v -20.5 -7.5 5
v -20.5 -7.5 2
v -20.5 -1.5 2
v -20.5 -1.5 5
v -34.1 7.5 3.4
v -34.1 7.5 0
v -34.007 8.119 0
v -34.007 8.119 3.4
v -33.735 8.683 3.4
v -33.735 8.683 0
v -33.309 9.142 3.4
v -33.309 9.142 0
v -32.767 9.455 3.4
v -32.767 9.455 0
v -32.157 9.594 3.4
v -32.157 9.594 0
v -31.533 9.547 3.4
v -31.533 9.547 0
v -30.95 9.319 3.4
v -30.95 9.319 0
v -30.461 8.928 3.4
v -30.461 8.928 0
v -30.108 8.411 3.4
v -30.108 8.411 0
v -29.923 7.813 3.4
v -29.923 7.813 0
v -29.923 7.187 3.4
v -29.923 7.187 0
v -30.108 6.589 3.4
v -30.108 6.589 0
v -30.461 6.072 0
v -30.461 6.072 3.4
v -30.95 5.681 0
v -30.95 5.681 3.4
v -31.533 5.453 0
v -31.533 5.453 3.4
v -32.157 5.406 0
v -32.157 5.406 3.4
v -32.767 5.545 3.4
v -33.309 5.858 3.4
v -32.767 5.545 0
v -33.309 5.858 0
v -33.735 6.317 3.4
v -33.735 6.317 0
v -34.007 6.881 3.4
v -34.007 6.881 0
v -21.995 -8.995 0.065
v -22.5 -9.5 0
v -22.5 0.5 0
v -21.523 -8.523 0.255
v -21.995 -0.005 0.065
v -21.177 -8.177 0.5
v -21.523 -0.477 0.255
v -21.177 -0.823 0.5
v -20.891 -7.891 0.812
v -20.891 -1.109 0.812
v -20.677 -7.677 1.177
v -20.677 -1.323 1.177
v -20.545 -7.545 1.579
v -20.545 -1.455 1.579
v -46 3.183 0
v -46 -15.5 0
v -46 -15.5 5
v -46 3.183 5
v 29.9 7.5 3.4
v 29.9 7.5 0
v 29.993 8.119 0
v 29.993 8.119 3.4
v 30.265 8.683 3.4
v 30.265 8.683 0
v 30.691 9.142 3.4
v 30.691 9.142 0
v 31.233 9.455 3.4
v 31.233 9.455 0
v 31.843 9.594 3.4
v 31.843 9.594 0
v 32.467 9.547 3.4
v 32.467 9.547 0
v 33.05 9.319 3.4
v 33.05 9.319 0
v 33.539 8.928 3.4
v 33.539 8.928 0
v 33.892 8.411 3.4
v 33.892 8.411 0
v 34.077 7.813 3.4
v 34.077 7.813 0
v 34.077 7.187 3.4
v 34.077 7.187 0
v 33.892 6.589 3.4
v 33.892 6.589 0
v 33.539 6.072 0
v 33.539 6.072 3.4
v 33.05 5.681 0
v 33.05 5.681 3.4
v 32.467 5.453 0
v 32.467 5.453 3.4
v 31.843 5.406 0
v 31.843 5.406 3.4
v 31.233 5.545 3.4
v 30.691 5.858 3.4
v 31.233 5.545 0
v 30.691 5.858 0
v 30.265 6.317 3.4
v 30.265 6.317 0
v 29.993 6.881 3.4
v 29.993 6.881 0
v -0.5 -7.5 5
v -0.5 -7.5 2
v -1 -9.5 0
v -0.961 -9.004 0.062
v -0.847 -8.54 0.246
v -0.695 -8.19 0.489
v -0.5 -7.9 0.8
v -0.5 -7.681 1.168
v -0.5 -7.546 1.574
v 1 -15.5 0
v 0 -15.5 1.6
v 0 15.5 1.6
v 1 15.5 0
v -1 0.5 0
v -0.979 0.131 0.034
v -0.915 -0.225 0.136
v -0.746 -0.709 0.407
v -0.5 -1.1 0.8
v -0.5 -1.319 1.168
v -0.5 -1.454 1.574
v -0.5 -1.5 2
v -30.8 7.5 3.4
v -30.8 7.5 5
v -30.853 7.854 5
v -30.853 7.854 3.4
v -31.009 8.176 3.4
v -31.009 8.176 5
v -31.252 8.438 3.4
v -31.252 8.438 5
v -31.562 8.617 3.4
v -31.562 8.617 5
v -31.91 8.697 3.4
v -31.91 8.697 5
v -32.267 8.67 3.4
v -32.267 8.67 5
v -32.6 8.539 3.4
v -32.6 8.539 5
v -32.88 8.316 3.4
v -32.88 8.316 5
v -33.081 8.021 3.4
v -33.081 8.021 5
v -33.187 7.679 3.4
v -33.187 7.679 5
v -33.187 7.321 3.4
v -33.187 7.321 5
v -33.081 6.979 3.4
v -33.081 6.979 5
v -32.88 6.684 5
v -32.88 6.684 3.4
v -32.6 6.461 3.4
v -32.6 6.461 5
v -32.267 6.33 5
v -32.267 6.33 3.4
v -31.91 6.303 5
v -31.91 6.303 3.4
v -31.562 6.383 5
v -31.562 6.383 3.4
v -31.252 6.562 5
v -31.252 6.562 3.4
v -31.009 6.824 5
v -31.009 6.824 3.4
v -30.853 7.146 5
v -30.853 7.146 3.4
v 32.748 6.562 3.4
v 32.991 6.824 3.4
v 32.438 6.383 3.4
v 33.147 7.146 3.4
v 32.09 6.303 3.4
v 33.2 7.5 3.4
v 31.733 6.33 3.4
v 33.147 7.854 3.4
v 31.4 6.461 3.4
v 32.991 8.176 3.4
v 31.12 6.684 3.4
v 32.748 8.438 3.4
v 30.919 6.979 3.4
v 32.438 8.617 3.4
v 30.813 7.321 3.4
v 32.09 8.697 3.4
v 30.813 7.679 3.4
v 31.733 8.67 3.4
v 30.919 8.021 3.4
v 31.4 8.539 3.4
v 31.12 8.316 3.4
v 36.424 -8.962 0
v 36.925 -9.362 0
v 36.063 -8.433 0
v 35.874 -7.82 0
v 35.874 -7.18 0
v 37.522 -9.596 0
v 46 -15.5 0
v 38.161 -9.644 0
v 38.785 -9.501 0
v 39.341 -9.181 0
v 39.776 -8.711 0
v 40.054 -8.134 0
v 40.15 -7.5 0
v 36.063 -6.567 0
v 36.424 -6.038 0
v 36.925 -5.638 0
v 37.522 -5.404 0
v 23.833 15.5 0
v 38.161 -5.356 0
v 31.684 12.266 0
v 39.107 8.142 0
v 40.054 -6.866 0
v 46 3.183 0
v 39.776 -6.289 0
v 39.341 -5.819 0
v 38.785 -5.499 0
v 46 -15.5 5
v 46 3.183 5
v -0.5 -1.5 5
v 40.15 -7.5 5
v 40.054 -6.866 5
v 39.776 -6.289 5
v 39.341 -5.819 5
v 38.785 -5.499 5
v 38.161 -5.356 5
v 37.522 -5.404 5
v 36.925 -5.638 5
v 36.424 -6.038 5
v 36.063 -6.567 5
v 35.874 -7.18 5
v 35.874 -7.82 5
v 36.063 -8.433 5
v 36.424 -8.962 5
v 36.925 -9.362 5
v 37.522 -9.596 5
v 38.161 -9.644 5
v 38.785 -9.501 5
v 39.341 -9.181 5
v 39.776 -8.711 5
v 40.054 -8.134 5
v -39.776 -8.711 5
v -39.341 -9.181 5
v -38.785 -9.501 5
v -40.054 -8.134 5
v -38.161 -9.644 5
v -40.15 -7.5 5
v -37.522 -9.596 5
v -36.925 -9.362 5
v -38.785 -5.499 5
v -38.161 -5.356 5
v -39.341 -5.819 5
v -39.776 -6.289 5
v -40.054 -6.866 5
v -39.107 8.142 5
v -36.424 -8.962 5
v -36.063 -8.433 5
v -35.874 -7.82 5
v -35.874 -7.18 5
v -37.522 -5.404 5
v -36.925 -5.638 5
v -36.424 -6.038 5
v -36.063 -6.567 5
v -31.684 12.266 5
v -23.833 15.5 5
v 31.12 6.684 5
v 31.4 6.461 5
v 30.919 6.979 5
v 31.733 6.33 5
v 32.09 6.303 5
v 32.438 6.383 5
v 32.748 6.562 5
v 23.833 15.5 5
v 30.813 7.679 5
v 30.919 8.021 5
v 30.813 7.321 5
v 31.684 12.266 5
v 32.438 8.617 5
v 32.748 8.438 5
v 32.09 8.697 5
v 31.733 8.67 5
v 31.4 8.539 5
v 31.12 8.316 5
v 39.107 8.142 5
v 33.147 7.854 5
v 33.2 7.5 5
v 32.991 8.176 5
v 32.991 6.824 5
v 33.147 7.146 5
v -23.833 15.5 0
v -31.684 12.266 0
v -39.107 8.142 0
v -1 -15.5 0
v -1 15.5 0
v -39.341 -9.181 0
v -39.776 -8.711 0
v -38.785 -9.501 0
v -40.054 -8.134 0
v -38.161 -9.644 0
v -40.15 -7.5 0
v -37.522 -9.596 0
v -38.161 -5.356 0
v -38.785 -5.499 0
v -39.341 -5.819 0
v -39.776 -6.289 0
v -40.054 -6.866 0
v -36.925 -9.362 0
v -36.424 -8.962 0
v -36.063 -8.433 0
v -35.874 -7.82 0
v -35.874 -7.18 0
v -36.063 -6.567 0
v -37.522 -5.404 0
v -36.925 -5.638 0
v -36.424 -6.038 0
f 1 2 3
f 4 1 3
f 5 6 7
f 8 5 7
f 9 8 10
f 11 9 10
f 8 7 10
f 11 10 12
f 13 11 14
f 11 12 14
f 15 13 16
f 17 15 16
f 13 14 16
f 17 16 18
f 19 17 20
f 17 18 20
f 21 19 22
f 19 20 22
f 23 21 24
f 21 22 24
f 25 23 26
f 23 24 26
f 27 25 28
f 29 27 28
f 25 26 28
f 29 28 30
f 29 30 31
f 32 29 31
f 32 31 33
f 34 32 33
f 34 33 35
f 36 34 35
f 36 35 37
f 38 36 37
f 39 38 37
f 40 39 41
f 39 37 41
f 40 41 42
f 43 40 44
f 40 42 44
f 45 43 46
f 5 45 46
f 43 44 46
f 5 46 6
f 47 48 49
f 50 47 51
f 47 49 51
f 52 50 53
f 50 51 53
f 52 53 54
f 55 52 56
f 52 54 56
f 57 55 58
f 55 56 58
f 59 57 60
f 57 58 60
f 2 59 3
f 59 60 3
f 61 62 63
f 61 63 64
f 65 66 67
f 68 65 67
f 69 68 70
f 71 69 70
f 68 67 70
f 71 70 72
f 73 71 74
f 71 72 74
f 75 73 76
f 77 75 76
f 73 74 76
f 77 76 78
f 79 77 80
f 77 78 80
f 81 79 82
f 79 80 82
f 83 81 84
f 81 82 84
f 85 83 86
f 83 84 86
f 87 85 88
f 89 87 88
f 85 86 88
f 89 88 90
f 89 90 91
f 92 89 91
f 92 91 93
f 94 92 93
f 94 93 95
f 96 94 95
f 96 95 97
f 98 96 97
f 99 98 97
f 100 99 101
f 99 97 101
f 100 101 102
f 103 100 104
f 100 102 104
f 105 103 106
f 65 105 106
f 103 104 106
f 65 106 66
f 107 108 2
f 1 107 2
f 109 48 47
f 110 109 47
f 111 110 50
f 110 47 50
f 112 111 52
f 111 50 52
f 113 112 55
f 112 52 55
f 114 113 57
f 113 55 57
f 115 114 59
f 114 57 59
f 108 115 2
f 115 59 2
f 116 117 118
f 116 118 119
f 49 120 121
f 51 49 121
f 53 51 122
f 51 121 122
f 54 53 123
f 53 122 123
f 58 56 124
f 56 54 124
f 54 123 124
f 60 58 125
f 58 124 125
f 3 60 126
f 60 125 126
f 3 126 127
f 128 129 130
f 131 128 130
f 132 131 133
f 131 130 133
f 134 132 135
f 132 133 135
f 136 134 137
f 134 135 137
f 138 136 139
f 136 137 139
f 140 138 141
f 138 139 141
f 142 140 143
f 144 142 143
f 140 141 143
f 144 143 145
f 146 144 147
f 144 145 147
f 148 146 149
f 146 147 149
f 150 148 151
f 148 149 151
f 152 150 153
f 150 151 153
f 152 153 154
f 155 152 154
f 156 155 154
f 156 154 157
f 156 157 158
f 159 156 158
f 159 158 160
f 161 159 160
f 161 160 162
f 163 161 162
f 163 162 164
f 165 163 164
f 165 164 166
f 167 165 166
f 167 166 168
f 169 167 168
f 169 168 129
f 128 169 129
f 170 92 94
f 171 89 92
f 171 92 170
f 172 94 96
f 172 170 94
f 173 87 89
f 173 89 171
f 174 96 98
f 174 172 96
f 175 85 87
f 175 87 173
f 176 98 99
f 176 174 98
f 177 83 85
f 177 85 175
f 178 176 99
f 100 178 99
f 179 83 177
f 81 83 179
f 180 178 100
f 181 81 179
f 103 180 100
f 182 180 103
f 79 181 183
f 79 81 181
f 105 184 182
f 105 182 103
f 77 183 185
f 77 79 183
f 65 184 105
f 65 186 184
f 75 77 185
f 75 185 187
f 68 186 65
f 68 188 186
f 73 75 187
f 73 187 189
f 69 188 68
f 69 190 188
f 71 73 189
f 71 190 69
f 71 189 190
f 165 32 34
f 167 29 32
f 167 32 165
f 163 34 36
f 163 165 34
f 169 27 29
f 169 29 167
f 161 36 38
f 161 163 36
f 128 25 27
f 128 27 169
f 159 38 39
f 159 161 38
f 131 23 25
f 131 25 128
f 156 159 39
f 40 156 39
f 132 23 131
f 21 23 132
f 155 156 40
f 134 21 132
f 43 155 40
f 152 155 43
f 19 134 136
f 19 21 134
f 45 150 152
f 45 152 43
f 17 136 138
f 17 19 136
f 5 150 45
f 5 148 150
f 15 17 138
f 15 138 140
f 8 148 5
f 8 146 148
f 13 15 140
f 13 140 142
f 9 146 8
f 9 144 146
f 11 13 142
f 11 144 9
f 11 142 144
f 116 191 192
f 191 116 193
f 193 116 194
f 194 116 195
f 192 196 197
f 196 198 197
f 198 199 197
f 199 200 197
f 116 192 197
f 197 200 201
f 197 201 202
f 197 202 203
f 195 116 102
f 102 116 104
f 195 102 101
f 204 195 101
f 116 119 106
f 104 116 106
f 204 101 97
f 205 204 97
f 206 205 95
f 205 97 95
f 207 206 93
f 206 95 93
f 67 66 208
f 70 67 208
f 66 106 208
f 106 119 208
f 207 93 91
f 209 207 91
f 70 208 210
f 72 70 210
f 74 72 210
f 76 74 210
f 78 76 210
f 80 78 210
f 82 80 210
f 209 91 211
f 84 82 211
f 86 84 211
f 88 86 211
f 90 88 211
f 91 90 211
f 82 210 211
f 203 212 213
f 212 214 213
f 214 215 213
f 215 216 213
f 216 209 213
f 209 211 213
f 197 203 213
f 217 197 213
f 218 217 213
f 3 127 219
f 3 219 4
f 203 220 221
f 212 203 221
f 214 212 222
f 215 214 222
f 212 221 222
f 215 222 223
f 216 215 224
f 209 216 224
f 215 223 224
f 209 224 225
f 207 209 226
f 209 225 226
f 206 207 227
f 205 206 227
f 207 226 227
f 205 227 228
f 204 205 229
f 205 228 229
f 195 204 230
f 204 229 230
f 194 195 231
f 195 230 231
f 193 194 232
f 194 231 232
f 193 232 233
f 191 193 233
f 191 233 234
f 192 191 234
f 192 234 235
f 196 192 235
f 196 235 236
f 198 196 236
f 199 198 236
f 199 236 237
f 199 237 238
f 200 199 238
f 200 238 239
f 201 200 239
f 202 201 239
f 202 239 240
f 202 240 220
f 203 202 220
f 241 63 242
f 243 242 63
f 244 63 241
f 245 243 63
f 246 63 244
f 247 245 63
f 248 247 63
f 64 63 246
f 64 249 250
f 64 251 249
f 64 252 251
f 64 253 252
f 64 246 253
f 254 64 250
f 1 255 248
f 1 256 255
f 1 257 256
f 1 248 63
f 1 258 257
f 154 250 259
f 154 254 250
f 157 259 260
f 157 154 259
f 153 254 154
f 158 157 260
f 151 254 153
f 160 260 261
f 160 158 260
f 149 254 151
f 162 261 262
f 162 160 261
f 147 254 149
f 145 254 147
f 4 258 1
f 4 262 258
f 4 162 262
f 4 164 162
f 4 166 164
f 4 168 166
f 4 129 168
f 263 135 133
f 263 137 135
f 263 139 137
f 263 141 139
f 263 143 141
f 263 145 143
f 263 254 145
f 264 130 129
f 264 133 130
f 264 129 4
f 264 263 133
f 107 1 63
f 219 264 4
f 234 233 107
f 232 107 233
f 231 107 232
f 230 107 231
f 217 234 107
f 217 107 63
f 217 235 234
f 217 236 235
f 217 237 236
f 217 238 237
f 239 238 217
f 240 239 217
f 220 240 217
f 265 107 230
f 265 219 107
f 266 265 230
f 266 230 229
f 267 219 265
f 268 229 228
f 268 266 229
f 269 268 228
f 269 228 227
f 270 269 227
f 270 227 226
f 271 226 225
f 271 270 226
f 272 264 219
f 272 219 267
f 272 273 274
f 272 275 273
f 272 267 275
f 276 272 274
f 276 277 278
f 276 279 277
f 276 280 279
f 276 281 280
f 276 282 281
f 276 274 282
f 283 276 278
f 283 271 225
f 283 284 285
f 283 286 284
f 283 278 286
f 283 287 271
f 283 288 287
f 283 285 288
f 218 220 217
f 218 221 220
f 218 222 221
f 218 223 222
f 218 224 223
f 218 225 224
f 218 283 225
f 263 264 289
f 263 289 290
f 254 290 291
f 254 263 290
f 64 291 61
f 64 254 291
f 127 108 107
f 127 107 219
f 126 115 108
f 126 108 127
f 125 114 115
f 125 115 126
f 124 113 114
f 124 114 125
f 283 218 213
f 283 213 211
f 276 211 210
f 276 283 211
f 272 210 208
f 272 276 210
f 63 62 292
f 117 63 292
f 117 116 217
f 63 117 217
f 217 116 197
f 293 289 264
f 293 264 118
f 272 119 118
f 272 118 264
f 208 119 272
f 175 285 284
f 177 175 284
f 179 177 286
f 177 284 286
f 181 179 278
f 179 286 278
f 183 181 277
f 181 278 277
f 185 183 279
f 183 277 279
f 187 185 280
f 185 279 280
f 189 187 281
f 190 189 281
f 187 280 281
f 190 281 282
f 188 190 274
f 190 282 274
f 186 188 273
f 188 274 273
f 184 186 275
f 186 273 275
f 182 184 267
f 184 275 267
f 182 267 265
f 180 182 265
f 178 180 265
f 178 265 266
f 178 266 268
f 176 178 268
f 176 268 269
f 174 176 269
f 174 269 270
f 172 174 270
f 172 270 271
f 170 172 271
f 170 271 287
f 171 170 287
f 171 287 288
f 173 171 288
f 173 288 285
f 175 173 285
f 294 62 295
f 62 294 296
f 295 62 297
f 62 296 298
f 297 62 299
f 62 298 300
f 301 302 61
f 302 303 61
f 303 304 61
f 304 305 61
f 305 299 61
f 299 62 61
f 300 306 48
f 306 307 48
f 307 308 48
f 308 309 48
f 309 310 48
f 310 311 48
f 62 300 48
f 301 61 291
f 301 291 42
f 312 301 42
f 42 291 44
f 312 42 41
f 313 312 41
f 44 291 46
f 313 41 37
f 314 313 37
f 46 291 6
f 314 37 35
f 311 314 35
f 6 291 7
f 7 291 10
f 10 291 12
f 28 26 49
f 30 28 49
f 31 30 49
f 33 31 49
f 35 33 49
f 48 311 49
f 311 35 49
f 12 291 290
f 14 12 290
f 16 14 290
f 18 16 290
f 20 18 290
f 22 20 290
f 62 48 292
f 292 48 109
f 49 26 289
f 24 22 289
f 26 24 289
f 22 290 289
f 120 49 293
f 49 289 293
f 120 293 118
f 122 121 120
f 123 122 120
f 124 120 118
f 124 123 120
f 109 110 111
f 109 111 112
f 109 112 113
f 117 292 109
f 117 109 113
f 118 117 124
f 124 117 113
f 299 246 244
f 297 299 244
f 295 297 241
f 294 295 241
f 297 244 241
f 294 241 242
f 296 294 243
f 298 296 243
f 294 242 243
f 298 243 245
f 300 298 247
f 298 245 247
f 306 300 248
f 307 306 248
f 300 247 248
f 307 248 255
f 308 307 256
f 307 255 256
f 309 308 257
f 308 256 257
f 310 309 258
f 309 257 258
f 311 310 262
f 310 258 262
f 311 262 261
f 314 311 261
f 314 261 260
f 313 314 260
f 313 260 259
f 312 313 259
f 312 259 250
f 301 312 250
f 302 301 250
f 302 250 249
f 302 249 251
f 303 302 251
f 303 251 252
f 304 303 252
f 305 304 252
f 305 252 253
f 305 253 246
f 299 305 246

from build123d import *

# Parameters (mm, degrees)
SKETCH3_W           = 92
SKETCH3_H           = 31
BOSS_EXTRUDE2_DEPTH = 5
SKETCH4_R           = 103
SKETCH4_R_2         = 73
CUT_EXTRUDE1_DEPTH  = 49.79805324
SKETCH5_R           = 2.15
CUT_EXTRUDE2_DEPTH  = 49.79805324
CUT_EXTRUDE4_DEPTH  = 56.695601263
SKETCH8_R           = 1.2
CUT_EXTRUDE5_DEPTH  = 49.79805324
SKETCH9_R           = 2.1
CUT_EXTRUDE6_DEPTH  = 3.4
SKETCH10_W          = 20
SKETCH10_H          = 6
CUT_EXTRUDE7_DEPTH  = 49.79805324
FILLET1_R           = 2


with BuildPart() as part:
    # Sketch3 → Boss-Extrude2 (new body)
    with BuildSketch(Plane.XY):
        Rectangle(SKETCH3_W, SKETCH3_H)
    extrude(amount=BOSS_EXTRUDE2_DEPTH)

    # Sketch4 → Cut-Extrude1 (cut, through all)
    with BuildSketch(Plane.XY.offset(5)):
        with Locations((0, -53.5)):
            Circle(SKETCH4_R)
        with Locations((0, -53.5)):
            Circle(SKETCH4_R_2, mode=Mode.SUBTRACT)
    extrude(amount=-CUT_EXTRUDE1_DEPTH, mode=Mode.SUBTRACT)

    # Sketch5 → Cut-Extrude2 (cut, through all)
    with BuildSketch(Plane.XY.offset(5)):
        with Locations((38, -7.5)):
            Circle(SKETCH5_R)
        with Locations(Location((-38, -7.5, 0), (0, 0, 180))):
            Circle(SKETCH5_R)
    extrude(amount=-CUT_EXTRUDE2_DEPTH, mode=Mode.SUBTRACT)

    # Sketch7 → Cut-Extrude4 (cut, through all)
    with BuildSketch(Plane.XZ.offset(15.5)):
        Polygon((-1, 0), (0, 1.6), (1, 0), align=None)
    extrude(amount=-CUT_EXTRUDE4_DEPTH, mode=Mode.SUBTRACT)

    # Sketch8 → Cut-Extrude5 (cut, through all)
    with BuildSketch(Plane.XY.offset(5)):
        with Locations((-32, 7.5)):
            Circle(SKETCH8_R)
        with Locations((32, 7.5)):
            Circle(SKETCH8_R)
    extrude(amount=-CUT_EXTRUDE5_DEPTH, mode=Mode.SUBTRACT)

    # Sketch9 → Cut-Extrude6 (cut)
    with BuildSketch(Plane(origin=(0, 0, 0), x_dir=(-1, 0, 0), z_dir=(0, 0, -1))):
        with Locations((32, 7.5)):
            Circle(SKETCH9_R)
        with Locations((-32, 7.5)):
            Circle(SKETCH9_R)
    extrude(amount=-CUT_EXTRUDE6_DEPTH, mode=Mode.SUBTRACT)

    # Sketch10 → Cut-Extrude7 (cut, through all)
    with BuildSketch(Plane(origin=(0, 0, 0), x_dir=(-1, 0, 0), z_dir=(0, 0, -1))):
        with Locations((10.5, -4.5)):
            Rectangle(SKETCH10_W, SKETCH10_H)
    extrude(amount=-CUT_EXTRUDE7_DEPTH, mode=Mode.SUBTRACT)

    # Fillet1
    # the kernel refuses this fillet: 2 mm, written as the material it takes off along each edge
    with BuildSketch(Plane(origin=(-20.5, -7.5, 0), x_dir=(0, -1, 0), z_dir=(1, 0, 0))) as fillet1_piece_1_section:
        with BuildLine():
            CenterArc((FILLET1_R, -FILLET1_R), FILLET1_R, 90, 90)
            Line((0, -FILLET1_R), (0, 0))
            Line((0, 0), (FILLET1_R, 0))
        make_face()
    fillet1_piece_1 = extrude(amount=24.5, mode=Mode.PRIVATE)
    fillet1_piece_1 = split(fillet1_piece_1, bisect_by=Plane(origin=(-0.5, -7.952790229, 0.452790229), z_dir=(-1, 0, 0)), keep=Keep.TOP, mode=Mode.PRIVATE)
    add(fillet1_piece_1, mode=Mode.SUBTRACT)
    with BuildSketch(Plane(origin=(-20.5, -1.5, 0), x_dir=(-1, 0, 0), z_dir=(0, -1, 0))) as fillet1_piece_2:
        with BuildLine():
            CenterArc((FILLET1_R, -FILLET1_R), FILLET1_R, 90, 90)
            Line((0, -FILLET1_R), (0, 0))
            Line((0, 0), (FILLET1_R, 0))
        make_face()
    extrude(amount=6, mode=Mode.SUBTRACT)
    with BuildSketch(Plane(origin=(4, -1.5, 0), x_dir=(0, 1, 0), z_dir=(-1, 0, 0))) as fillet1_piece_3_section:
        with BuildLine():
            CenterArc((FILLET1_R, -FILLET1_R), FILLET1_R, 90, 90)
            Line((0, -FILLET1_R), (0, 0))
            Line((0, 0), (FILLET1_R, 0))
        make_face()
    fillet1_piece_3 = extrude(amount=24.5, mode=Mode.PRIVATE)
    fillet1_piece_3 = split(fillet1_piece_3, bisect_by=Plane(origin=(-0.5, -1.047209771, 0.452790229), z_dir=(-1, 0, 0)), keep=Keep.TOP, mode=Mode.PRIVATE)
    add(fillet1_piece_3, mode=Mode.SUBTRACT)
    with BuildSketch(Plane(origin=(-25.5, -7.5, 0), x_dir=(0, -1, 0), z_dir=(1, 0, 0))) as fillet1_piece_4a_section:
        with BuildLine():
            CenterArc((FILLET1_R, -FILLET1_R), FILLET1_R, 90, 90)
            Line((0, -FILLET1_R), (0, 0))
            Line((0, 0), (FILLET1_R, 0))
        make_face()
    fillet1_piece_4a = extrude(amount=29.5, mode=Mode.PRIVATE)
    fillet1_piece_4a = split(fillet1_piece_4a, bisect_by=Plane(origin=(-20.5, -7.952790229, 0.452790229), z_dir=(-1, 0, 0)), keep=Keep.TOP, mode=Mode.PRIVATE)
    with BuildSketch(Plane(origin=(-20.5, -1.5, 0), x_dir=(-1, 0, 0), z_dir=(0, -1, 0))) as fillet1_piece_4b_section:
        with BuildLine():
            CenterArc((FILLET1_R, -FILLET1_R), FILLET1_R, 90, 90)
            Line((0, -FILLET1_R), (0, 0))
            Line((0, 0), (FILLET1_R, 0))
        make_face()
    fillet1_piece_4b = extrude(amount=11, mode=Mode.PRIVATE)
    fillet1_piece_4b = split(fillet1_piece_4b, bisect_by=Plane(origin=(-20.952790229, -7.5, 0.452790229), z_dir=(0, -1, 0)), keep=Keep.TOP, mode=Mode.PRIVATE)
    fillet1_piece_4 = fillet1_piece_4a & fillet1_piece_4b
    add(fillet1_piece_4, mode=Mode.SUBTRACT)
    with BuildSketch(Plane(origin=(-20.5, 3.5, 0), x_dir=(-1, 0, 0), z_dir=(0, -1, 0))) as fillet1_piece_5a_section:
        with BuildLine():
            CenterArc((FILLET1_R, -FILLET1_R), FILLET1_R, 90, 90)
            Line((0, -FILLET1_R), (0, 0))
            Line((0, 0), (FILLET1_R, 0))
        make_face()
    fillet1_piece_5a = extrude(amount=11, mode=Mode.PRIVATE)
    fillet1_piece_5a = split(fillet1_piece_5a, bisect_by=Plane(origin=(-20.952790229, -1.5, 0.452790229), z_dir=(0, 1, 0)), keep=Keep.TOP, mode=Mode.PRIVATE)
    with BuildSketch(Plane(origin=(4, -1.5, 0), x_dir=(0, 1, 0), z_dir=(-1, 0, 0))) as fillet1_piece_5b_section:
        with BuildLine():
            CenterArc((FILLET1_R, -FILLET1_R), FILLET1_R, 90, 90)
            Line((0, -FILLET1_R), (0, 0))
            Line((0, 0), (FILLET1_R, 0))
        make_face()
    fillet1_piece_5b = extrude(amount=29.5, mode=Mode.PRIVATE)
    fillet1_piece_5b = split(fillet1_piece_5b, bisect_by=Plane(origin=(-20.5, -1.047209771, 0.452790229), z_dir=(-1, 0, 0)), keep=Keep.TOP, mode=Mode.PRIVATE)
    fillet1_piece_5 = fillet1_piece_5a & fillet1_piece_5b
    add(fillet1_piece_5, mode=Mode.SUBTRACT)


solid = part.part
